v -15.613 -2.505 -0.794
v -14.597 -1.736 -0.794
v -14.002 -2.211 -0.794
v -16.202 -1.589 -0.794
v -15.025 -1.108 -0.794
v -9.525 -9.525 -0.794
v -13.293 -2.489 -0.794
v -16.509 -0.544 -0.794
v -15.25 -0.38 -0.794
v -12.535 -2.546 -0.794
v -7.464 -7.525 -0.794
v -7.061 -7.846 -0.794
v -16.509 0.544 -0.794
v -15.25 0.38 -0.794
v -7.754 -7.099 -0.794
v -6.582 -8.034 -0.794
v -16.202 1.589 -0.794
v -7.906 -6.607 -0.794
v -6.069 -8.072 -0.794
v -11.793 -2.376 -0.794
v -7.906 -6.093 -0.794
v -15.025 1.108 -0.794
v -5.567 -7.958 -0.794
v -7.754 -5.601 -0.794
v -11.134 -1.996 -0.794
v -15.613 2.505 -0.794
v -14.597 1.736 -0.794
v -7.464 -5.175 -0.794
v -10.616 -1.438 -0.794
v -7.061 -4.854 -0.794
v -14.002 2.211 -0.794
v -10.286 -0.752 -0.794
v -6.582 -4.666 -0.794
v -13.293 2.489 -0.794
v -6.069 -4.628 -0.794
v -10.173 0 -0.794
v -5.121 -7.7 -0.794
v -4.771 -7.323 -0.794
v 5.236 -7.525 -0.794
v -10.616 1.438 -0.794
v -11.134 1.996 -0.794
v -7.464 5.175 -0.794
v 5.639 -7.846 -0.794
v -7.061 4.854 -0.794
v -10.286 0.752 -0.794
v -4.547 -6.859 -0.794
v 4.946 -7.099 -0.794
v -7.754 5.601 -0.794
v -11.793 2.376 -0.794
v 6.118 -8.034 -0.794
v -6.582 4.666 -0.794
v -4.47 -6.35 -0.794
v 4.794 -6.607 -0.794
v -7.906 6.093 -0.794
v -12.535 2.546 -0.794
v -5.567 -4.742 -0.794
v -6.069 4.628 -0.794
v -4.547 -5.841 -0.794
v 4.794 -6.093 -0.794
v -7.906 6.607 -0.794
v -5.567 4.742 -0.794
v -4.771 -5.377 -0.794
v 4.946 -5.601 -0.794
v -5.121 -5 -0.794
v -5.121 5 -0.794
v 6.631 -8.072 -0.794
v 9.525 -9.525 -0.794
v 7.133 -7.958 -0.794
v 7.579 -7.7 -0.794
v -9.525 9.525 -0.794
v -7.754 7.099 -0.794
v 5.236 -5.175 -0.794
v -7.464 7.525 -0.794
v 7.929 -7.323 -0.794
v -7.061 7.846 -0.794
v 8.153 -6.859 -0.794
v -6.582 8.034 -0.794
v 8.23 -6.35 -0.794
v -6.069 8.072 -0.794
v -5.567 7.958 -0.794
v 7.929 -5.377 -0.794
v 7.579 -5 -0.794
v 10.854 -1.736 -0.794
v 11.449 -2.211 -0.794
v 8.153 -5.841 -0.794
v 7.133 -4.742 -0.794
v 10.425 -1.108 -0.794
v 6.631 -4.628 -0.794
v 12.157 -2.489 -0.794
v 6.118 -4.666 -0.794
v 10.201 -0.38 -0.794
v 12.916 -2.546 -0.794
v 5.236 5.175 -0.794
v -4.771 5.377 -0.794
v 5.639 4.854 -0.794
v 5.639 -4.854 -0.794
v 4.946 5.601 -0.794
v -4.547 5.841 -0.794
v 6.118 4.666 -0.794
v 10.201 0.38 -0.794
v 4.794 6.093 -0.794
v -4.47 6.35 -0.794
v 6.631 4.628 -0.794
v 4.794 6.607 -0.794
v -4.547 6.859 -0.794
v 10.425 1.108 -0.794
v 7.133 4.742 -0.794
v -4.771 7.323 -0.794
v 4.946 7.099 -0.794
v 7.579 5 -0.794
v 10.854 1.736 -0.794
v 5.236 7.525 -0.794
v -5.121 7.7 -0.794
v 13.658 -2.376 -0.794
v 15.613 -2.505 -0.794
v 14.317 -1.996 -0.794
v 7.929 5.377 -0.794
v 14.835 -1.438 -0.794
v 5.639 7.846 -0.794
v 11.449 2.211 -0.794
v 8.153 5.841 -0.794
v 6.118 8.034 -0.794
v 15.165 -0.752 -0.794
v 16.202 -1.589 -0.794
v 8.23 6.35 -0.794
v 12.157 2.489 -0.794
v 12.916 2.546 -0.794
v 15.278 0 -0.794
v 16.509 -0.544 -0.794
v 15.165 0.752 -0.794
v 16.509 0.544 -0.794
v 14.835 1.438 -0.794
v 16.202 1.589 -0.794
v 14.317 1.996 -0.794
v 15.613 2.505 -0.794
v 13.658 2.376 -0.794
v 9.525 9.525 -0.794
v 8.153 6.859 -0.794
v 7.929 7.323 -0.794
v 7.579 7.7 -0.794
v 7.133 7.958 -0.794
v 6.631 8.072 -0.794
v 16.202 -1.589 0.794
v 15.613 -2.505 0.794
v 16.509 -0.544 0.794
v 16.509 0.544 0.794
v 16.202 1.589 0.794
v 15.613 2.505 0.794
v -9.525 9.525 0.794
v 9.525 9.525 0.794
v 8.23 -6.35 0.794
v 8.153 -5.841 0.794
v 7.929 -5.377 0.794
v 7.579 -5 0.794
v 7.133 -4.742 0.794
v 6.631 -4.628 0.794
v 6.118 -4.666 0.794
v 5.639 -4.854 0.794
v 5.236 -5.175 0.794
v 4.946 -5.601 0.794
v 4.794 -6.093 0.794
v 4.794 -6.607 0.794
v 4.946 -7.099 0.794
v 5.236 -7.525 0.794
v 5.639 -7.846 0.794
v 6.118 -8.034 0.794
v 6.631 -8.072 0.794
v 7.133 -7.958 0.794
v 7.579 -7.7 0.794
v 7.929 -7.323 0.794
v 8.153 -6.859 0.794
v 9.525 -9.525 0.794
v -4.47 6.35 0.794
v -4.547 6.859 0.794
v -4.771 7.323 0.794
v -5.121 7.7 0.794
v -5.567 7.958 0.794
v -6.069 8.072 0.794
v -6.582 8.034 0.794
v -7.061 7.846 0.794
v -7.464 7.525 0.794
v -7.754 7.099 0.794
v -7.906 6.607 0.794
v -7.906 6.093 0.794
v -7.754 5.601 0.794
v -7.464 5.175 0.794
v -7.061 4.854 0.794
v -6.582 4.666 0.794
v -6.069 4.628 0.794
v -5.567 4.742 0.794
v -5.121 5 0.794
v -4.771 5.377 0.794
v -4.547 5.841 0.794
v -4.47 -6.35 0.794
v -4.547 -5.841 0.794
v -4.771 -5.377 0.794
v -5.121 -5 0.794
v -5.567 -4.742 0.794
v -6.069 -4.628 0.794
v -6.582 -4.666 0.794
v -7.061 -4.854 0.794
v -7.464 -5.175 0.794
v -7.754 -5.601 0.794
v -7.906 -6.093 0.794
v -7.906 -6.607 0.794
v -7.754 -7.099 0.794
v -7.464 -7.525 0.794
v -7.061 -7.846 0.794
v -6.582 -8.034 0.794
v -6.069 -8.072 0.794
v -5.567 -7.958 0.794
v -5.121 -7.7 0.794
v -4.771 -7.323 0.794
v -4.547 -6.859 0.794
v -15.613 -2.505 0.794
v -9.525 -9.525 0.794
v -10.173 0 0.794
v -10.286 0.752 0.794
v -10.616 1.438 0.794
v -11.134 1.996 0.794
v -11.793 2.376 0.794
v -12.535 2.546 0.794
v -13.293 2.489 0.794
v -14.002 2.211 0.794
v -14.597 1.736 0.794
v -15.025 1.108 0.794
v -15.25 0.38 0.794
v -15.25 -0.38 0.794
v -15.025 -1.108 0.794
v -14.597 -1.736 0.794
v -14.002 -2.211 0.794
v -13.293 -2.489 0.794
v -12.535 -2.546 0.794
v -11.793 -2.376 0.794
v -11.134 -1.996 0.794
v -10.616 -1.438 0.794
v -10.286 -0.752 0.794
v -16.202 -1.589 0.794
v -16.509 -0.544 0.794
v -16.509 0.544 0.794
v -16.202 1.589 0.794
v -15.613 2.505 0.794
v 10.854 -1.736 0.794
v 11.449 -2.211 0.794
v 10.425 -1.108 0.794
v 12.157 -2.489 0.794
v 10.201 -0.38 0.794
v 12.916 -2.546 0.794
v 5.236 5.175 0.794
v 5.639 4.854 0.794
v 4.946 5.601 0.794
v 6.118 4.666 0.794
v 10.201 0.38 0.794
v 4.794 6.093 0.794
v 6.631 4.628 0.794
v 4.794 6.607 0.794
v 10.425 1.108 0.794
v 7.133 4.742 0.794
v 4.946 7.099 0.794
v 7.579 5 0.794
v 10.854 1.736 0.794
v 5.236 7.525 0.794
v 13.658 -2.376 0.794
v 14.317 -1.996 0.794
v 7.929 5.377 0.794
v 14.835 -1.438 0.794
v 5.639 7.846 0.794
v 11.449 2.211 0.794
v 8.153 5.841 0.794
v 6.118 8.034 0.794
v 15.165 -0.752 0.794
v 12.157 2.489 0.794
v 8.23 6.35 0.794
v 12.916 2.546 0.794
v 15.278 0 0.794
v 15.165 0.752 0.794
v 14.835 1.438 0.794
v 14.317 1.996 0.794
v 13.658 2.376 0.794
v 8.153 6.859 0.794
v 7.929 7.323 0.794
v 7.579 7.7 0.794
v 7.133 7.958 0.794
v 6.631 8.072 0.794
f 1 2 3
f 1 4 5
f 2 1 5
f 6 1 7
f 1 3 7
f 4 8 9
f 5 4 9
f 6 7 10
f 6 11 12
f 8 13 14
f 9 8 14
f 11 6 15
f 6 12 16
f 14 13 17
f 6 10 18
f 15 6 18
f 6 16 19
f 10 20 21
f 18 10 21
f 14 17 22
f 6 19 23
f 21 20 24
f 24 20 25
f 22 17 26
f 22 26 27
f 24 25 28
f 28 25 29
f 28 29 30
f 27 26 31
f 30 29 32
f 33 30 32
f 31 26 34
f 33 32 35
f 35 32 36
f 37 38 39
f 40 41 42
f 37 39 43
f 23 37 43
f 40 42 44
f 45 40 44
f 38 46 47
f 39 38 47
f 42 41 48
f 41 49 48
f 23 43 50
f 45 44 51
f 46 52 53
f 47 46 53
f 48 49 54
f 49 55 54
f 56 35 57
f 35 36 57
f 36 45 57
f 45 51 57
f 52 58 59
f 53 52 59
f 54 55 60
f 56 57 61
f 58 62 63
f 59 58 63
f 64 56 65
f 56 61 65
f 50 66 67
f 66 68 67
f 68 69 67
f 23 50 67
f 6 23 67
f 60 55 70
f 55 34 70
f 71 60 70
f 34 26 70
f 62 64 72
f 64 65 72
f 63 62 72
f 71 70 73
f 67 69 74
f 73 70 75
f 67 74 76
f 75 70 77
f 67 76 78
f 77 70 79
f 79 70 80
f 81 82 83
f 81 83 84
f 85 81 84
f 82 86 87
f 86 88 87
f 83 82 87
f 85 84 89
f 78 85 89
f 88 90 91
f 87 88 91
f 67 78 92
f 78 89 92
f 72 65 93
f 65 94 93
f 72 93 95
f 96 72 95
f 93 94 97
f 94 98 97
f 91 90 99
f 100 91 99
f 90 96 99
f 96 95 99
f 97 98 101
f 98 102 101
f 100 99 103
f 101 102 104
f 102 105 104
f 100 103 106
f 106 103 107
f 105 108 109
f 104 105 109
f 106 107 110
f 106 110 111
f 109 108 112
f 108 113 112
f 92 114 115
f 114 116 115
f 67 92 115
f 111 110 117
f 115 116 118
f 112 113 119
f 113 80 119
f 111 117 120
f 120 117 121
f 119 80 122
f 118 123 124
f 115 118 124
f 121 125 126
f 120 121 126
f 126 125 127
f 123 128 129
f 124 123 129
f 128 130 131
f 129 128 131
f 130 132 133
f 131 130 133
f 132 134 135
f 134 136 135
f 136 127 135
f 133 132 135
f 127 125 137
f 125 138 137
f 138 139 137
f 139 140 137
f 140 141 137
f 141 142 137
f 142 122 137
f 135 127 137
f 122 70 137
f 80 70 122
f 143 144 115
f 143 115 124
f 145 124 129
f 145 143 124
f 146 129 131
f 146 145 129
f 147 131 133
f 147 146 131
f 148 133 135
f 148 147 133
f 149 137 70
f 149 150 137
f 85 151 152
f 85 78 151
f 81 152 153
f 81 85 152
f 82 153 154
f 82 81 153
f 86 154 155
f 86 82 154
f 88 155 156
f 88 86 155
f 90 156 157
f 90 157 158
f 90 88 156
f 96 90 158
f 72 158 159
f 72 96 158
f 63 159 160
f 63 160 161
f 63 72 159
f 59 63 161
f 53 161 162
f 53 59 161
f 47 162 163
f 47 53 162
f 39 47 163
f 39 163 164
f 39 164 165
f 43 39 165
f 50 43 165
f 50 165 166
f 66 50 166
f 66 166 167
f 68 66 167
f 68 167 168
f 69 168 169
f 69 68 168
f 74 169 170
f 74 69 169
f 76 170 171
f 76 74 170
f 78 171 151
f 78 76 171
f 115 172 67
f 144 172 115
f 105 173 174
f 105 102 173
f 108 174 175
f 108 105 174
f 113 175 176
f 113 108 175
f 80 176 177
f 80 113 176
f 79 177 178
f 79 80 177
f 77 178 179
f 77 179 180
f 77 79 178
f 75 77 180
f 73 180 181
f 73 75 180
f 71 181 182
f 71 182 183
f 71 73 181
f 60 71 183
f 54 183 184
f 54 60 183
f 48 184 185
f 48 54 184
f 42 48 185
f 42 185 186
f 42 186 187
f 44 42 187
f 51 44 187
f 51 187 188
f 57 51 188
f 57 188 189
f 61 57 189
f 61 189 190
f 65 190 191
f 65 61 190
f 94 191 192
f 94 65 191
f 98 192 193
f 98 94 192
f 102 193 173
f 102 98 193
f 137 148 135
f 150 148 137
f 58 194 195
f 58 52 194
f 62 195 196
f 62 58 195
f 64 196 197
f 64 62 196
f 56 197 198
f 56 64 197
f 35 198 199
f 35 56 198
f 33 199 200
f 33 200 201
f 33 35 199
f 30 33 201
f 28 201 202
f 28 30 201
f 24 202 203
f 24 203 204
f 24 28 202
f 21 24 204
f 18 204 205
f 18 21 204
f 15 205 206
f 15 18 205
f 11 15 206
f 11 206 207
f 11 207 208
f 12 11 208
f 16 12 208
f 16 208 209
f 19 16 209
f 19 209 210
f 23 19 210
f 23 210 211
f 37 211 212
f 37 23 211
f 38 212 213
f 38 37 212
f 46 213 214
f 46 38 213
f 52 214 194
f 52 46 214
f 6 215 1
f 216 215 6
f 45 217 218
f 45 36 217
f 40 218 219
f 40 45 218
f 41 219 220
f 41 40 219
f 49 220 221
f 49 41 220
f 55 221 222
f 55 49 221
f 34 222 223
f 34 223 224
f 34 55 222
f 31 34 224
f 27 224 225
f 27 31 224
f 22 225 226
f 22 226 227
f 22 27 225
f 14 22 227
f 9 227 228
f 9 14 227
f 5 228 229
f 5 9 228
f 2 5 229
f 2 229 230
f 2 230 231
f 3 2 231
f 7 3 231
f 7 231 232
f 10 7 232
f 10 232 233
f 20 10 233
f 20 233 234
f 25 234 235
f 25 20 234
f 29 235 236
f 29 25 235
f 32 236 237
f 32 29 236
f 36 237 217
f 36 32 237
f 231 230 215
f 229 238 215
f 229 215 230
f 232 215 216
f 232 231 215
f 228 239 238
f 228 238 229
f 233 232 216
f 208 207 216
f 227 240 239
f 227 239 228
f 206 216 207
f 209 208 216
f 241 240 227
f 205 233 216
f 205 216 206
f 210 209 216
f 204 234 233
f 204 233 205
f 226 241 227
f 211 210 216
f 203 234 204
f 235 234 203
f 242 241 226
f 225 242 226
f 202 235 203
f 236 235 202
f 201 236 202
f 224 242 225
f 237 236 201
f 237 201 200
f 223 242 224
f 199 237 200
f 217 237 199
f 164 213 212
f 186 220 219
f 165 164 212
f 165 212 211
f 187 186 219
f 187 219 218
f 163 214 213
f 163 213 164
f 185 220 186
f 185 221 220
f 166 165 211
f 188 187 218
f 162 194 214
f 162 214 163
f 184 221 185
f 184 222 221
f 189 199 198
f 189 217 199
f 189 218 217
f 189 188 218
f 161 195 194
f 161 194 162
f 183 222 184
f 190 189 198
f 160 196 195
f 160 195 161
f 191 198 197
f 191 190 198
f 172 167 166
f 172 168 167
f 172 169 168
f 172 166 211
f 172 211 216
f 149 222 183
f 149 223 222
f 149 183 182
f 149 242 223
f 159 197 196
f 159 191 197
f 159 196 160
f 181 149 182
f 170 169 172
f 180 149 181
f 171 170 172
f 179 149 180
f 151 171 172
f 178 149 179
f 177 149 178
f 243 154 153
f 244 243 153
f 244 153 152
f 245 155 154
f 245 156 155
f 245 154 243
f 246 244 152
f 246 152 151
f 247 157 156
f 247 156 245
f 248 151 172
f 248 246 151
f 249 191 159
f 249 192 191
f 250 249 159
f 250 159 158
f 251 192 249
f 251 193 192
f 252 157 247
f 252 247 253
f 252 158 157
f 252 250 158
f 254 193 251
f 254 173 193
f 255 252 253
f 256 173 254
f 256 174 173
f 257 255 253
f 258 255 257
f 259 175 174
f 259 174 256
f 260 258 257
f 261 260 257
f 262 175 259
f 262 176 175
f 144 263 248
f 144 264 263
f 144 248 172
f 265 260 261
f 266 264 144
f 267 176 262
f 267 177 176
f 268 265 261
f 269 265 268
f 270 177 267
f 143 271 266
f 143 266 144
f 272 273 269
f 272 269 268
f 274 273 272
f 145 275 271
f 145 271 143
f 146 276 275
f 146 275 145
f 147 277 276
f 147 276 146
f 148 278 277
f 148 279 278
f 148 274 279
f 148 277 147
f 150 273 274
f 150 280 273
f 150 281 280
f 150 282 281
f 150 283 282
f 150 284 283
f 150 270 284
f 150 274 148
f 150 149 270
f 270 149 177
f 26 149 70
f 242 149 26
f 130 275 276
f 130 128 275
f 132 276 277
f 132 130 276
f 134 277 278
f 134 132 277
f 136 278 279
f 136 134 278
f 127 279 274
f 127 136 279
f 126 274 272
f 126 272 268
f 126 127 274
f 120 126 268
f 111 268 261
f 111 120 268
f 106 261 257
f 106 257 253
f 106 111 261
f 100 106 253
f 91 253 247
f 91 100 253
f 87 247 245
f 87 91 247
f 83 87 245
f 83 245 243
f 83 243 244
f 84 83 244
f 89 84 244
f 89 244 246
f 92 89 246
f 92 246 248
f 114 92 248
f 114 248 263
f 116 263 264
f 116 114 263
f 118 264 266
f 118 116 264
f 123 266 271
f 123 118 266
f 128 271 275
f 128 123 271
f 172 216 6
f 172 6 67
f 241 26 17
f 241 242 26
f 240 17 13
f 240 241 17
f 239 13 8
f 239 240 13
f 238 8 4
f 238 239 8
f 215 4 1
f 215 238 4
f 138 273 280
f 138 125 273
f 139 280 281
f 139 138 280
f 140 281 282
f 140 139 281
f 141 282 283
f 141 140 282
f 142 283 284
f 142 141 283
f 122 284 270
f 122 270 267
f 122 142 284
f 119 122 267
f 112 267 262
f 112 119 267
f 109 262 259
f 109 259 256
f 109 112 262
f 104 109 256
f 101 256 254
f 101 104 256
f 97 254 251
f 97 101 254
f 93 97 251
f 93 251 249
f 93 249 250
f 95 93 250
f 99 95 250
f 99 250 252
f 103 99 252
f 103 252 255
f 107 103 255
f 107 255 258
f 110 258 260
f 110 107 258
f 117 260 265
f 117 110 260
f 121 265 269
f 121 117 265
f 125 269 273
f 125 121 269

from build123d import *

# Parameters (mm, degrees)
CROQUIS1_R              = 1.7272
CROQUIS1_R_2            = 2.5527
SALIENTE_EXTRUIR1_DEPTH = 0.79375


with BuildPart() as part:
    # Croquis1 → Saliente-Extruir1 (new, symmetric)
    with BuildSketch(Plane.XY):
        with BuildLine():
            ThreePointArc((-15.613365943, 2.50453349), (-16.5481, 0), (-15.613365943, -2.50453349))
            Line((-15.613365943, -2.50453349), (-9.525, -9.525))
            Line((-9.525, -9.525), (9.525, -9.525))
            Line((9.525, -9.525), (15.613365943, -2.50453349))
            ThreePointArc((15.613365943, -2.50453349), (16.5481, 0), (15.613365943, 2.50453349))
            Line((15.613365943, 2.50453349), (9.525, 9.525))
            Line((9.525, 9.525), (-9.525, 9.525))
            Line((-9.525, 9.525), (-15.613365943, 2.50453349))
        make_face()
        with Locations((-6.1976, -6.35)):
            Circle(CROQUIS1_R, mode=Mode.SUBTRACT)
        with Locations((6.5024, -6.35)):
            Circle(CROQUIS1_R, mode=Mode.SUBTRACT)
        with Locations((-12.7254, 0)):
            Circle(CROQUIS1_R_2, mode=Mode.SUBTRACT)
        with Locations((-6.1976, 6.35)):
            Circle(CROQUIS1_R, mode=Mode.SUBTRACT)
        with Locations((6.5024, 6.35)):
            Circle(CROQUIS1_R, mode=Mode.SUBTRACT)
        with Locations((12.7254, 0)):
            Circle(CROQUIS1_R_2, mode=Mode.SUBTRACT)
    extrude(amount=SALIENTE_EXTRUIR1_DEPTH, both=True)


solid = part.part
